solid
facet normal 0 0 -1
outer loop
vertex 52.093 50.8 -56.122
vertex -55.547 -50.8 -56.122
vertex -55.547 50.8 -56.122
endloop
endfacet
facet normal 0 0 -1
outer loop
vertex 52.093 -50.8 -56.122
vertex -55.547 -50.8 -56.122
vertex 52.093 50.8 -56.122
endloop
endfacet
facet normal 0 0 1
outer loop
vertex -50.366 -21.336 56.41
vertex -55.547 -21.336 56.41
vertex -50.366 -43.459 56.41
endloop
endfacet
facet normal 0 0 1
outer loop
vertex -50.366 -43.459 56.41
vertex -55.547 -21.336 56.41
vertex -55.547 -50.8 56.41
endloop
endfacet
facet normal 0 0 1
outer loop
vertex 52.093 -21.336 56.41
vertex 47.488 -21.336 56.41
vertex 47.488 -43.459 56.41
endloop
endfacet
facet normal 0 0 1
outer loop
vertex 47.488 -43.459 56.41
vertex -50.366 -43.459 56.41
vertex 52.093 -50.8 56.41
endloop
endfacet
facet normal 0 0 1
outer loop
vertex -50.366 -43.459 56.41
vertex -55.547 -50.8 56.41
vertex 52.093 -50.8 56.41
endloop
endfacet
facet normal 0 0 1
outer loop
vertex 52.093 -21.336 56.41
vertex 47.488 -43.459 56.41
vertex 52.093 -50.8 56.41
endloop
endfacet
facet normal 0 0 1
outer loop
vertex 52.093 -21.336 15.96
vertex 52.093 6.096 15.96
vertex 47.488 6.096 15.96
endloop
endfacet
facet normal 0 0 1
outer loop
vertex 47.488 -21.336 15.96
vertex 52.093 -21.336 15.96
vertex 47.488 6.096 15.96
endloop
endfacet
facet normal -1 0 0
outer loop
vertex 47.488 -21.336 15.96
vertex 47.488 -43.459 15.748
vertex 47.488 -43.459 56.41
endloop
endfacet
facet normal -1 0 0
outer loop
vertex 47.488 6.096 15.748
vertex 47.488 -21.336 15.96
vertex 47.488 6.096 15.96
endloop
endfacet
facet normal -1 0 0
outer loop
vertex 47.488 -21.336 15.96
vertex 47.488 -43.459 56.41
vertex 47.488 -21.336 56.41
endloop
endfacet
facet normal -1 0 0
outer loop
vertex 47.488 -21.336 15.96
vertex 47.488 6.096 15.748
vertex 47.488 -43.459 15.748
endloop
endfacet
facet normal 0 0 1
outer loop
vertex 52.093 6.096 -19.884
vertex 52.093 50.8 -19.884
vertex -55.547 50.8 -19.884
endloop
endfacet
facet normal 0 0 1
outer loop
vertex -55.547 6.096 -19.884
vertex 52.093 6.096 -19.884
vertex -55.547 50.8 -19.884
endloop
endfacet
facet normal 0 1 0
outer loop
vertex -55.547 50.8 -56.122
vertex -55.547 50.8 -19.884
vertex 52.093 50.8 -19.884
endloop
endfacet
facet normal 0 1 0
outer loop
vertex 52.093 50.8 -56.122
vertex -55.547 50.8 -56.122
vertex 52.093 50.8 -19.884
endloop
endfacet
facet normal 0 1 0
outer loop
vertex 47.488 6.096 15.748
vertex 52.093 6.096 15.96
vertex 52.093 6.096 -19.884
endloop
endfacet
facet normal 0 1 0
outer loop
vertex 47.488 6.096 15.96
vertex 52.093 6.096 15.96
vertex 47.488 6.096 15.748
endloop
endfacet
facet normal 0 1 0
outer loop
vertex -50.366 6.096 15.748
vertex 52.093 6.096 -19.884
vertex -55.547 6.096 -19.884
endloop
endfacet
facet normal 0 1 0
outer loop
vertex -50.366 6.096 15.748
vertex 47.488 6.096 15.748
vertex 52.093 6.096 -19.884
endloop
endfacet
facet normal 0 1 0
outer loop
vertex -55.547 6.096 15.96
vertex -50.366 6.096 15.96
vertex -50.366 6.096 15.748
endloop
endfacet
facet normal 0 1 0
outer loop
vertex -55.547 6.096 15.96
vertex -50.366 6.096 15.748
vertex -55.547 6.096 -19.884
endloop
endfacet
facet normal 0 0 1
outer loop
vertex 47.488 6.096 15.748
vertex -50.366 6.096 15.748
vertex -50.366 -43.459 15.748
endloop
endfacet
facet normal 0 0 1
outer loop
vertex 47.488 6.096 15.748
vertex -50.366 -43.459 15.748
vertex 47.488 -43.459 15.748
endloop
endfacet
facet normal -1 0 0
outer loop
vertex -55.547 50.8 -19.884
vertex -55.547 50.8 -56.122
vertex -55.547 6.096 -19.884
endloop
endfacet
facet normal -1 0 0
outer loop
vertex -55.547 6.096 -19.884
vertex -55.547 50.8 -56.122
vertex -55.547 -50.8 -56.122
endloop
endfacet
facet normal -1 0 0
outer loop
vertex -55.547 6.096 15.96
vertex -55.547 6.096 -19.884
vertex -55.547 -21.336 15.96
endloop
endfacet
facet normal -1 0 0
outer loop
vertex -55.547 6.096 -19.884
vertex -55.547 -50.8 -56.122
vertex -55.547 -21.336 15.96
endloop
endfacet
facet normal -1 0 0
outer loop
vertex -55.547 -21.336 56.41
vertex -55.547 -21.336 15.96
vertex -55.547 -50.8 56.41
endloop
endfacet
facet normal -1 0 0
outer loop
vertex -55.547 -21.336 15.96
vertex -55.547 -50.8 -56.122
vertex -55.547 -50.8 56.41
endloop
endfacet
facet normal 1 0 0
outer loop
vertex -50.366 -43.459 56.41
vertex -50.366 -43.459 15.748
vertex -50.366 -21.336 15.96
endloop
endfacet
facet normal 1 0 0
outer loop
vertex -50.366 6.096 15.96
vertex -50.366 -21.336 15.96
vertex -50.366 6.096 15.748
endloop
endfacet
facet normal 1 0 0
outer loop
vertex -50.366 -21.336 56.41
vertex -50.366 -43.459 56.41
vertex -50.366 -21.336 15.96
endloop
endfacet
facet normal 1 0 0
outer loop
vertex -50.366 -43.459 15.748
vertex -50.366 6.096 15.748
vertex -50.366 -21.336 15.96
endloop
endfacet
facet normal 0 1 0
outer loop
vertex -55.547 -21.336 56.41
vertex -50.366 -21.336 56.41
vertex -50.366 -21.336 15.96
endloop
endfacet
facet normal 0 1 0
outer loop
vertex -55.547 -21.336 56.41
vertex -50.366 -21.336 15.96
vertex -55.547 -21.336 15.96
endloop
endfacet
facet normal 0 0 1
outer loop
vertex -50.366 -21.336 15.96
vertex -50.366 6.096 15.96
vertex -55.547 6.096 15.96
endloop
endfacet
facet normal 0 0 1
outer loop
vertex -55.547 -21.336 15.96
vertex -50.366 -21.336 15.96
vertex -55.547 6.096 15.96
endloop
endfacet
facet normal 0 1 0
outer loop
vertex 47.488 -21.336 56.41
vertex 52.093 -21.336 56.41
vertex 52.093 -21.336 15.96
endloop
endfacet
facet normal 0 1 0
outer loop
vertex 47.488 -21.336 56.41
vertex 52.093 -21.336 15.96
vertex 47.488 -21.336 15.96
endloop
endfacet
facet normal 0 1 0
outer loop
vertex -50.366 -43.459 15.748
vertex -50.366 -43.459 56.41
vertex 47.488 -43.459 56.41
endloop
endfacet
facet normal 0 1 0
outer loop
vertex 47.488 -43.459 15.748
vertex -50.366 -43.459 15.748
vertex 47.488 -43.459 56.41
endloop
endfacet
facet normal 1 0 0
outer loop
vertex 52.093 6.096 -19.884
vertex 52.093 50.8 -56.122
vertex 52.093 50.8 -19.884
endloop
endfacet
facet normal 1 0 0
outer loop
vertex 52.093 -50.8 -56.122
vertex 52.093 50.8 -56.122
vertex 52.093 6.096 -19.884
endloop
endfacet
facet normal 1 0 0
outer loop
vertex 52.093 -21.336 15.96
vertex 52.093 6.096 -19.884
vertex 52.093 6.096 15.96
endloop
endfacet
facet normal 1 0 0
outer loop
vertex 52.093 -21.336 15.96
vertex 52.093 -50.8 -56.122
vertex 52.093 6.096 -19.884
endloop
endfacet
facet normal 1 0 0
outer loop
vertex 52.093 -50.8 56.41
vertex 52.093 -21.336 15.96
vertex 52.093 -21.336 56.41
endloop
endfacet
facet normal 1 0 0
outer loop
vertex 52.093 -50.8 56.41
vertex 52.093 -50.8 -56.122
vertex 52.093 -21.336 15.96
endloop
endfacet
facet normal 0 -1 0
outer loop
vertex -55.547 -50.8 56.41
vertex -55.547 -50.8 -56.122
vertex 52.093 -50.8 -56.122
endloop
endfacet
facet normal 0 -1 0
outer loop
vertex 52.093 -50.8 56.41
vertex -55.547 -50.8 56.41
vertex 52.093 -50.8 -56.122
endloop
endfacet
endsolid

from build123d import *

# Parameters (mm, degrees)
F0_W          = 107.63935
F0_H          = 112.532053
F1_DEPTH      = 50.8
F1_DEPTH_BACK = 50.8
F2_W          = 107.63935
F2_H          = 76.294005
F3_DEPTH      = 44.704
F4_W          = 107.63935
F4_H          = 40.449448
F5_DEPTH      = 27.432
F7_W          = 97.853955
F7_H          = 88.931974
F8_DEPTH      = 41.656


with BuildPart() as f1:
    # F0 (on Front) → F1 (new body, two sides)
    with BuildSketch(Plane.XZ) as f1_sk:
        with Locations((-1.726836, 0.143902)):
            Rectangle(F0_W, F0_H)
    extrude(amount=F1_DEPTH)
    extrude(f1_sk.sketch, amount=-F1_DEPTH_BACK)

    # F2 (on face) → F3 (cut)
    with BuildSketch(Plane(origin=(0, 50.8, 0), x_dir=(-1, 0, 0), z_dir=(0, 1, 0))):
        with Locations((1.726836, 18.262926)):
            Rectangle(F2_W, F2_H)
    extrude(amount=-F3_DEPTH, mode=Mode.SUBTRACT)

    # F4 (on face) → F5 (cut)
    with BuildSketch(Plane(origin=(0, 6.096, 0), x_dir=(-1, 0, 0), z_dir=(0, 1, 0))):
        with Locations((1.726836, 36.185205)):
            Rectangle(F4_W, F4_H)
    extrude(amount=-F5_DEPTH, mode=Mode.SUBTRACT)

    # F7 (on offset) → F8 (cut)
    with BuildSketch(Plane.XY.offset(57.404)):
        with Locations((-1.43903, 1.00732)):
            Rectangle(F7_W, F7_H)
    extrude(amount=-F8_DEPTH, mode=Mode.SUBTRACT)


solid = f1.part
